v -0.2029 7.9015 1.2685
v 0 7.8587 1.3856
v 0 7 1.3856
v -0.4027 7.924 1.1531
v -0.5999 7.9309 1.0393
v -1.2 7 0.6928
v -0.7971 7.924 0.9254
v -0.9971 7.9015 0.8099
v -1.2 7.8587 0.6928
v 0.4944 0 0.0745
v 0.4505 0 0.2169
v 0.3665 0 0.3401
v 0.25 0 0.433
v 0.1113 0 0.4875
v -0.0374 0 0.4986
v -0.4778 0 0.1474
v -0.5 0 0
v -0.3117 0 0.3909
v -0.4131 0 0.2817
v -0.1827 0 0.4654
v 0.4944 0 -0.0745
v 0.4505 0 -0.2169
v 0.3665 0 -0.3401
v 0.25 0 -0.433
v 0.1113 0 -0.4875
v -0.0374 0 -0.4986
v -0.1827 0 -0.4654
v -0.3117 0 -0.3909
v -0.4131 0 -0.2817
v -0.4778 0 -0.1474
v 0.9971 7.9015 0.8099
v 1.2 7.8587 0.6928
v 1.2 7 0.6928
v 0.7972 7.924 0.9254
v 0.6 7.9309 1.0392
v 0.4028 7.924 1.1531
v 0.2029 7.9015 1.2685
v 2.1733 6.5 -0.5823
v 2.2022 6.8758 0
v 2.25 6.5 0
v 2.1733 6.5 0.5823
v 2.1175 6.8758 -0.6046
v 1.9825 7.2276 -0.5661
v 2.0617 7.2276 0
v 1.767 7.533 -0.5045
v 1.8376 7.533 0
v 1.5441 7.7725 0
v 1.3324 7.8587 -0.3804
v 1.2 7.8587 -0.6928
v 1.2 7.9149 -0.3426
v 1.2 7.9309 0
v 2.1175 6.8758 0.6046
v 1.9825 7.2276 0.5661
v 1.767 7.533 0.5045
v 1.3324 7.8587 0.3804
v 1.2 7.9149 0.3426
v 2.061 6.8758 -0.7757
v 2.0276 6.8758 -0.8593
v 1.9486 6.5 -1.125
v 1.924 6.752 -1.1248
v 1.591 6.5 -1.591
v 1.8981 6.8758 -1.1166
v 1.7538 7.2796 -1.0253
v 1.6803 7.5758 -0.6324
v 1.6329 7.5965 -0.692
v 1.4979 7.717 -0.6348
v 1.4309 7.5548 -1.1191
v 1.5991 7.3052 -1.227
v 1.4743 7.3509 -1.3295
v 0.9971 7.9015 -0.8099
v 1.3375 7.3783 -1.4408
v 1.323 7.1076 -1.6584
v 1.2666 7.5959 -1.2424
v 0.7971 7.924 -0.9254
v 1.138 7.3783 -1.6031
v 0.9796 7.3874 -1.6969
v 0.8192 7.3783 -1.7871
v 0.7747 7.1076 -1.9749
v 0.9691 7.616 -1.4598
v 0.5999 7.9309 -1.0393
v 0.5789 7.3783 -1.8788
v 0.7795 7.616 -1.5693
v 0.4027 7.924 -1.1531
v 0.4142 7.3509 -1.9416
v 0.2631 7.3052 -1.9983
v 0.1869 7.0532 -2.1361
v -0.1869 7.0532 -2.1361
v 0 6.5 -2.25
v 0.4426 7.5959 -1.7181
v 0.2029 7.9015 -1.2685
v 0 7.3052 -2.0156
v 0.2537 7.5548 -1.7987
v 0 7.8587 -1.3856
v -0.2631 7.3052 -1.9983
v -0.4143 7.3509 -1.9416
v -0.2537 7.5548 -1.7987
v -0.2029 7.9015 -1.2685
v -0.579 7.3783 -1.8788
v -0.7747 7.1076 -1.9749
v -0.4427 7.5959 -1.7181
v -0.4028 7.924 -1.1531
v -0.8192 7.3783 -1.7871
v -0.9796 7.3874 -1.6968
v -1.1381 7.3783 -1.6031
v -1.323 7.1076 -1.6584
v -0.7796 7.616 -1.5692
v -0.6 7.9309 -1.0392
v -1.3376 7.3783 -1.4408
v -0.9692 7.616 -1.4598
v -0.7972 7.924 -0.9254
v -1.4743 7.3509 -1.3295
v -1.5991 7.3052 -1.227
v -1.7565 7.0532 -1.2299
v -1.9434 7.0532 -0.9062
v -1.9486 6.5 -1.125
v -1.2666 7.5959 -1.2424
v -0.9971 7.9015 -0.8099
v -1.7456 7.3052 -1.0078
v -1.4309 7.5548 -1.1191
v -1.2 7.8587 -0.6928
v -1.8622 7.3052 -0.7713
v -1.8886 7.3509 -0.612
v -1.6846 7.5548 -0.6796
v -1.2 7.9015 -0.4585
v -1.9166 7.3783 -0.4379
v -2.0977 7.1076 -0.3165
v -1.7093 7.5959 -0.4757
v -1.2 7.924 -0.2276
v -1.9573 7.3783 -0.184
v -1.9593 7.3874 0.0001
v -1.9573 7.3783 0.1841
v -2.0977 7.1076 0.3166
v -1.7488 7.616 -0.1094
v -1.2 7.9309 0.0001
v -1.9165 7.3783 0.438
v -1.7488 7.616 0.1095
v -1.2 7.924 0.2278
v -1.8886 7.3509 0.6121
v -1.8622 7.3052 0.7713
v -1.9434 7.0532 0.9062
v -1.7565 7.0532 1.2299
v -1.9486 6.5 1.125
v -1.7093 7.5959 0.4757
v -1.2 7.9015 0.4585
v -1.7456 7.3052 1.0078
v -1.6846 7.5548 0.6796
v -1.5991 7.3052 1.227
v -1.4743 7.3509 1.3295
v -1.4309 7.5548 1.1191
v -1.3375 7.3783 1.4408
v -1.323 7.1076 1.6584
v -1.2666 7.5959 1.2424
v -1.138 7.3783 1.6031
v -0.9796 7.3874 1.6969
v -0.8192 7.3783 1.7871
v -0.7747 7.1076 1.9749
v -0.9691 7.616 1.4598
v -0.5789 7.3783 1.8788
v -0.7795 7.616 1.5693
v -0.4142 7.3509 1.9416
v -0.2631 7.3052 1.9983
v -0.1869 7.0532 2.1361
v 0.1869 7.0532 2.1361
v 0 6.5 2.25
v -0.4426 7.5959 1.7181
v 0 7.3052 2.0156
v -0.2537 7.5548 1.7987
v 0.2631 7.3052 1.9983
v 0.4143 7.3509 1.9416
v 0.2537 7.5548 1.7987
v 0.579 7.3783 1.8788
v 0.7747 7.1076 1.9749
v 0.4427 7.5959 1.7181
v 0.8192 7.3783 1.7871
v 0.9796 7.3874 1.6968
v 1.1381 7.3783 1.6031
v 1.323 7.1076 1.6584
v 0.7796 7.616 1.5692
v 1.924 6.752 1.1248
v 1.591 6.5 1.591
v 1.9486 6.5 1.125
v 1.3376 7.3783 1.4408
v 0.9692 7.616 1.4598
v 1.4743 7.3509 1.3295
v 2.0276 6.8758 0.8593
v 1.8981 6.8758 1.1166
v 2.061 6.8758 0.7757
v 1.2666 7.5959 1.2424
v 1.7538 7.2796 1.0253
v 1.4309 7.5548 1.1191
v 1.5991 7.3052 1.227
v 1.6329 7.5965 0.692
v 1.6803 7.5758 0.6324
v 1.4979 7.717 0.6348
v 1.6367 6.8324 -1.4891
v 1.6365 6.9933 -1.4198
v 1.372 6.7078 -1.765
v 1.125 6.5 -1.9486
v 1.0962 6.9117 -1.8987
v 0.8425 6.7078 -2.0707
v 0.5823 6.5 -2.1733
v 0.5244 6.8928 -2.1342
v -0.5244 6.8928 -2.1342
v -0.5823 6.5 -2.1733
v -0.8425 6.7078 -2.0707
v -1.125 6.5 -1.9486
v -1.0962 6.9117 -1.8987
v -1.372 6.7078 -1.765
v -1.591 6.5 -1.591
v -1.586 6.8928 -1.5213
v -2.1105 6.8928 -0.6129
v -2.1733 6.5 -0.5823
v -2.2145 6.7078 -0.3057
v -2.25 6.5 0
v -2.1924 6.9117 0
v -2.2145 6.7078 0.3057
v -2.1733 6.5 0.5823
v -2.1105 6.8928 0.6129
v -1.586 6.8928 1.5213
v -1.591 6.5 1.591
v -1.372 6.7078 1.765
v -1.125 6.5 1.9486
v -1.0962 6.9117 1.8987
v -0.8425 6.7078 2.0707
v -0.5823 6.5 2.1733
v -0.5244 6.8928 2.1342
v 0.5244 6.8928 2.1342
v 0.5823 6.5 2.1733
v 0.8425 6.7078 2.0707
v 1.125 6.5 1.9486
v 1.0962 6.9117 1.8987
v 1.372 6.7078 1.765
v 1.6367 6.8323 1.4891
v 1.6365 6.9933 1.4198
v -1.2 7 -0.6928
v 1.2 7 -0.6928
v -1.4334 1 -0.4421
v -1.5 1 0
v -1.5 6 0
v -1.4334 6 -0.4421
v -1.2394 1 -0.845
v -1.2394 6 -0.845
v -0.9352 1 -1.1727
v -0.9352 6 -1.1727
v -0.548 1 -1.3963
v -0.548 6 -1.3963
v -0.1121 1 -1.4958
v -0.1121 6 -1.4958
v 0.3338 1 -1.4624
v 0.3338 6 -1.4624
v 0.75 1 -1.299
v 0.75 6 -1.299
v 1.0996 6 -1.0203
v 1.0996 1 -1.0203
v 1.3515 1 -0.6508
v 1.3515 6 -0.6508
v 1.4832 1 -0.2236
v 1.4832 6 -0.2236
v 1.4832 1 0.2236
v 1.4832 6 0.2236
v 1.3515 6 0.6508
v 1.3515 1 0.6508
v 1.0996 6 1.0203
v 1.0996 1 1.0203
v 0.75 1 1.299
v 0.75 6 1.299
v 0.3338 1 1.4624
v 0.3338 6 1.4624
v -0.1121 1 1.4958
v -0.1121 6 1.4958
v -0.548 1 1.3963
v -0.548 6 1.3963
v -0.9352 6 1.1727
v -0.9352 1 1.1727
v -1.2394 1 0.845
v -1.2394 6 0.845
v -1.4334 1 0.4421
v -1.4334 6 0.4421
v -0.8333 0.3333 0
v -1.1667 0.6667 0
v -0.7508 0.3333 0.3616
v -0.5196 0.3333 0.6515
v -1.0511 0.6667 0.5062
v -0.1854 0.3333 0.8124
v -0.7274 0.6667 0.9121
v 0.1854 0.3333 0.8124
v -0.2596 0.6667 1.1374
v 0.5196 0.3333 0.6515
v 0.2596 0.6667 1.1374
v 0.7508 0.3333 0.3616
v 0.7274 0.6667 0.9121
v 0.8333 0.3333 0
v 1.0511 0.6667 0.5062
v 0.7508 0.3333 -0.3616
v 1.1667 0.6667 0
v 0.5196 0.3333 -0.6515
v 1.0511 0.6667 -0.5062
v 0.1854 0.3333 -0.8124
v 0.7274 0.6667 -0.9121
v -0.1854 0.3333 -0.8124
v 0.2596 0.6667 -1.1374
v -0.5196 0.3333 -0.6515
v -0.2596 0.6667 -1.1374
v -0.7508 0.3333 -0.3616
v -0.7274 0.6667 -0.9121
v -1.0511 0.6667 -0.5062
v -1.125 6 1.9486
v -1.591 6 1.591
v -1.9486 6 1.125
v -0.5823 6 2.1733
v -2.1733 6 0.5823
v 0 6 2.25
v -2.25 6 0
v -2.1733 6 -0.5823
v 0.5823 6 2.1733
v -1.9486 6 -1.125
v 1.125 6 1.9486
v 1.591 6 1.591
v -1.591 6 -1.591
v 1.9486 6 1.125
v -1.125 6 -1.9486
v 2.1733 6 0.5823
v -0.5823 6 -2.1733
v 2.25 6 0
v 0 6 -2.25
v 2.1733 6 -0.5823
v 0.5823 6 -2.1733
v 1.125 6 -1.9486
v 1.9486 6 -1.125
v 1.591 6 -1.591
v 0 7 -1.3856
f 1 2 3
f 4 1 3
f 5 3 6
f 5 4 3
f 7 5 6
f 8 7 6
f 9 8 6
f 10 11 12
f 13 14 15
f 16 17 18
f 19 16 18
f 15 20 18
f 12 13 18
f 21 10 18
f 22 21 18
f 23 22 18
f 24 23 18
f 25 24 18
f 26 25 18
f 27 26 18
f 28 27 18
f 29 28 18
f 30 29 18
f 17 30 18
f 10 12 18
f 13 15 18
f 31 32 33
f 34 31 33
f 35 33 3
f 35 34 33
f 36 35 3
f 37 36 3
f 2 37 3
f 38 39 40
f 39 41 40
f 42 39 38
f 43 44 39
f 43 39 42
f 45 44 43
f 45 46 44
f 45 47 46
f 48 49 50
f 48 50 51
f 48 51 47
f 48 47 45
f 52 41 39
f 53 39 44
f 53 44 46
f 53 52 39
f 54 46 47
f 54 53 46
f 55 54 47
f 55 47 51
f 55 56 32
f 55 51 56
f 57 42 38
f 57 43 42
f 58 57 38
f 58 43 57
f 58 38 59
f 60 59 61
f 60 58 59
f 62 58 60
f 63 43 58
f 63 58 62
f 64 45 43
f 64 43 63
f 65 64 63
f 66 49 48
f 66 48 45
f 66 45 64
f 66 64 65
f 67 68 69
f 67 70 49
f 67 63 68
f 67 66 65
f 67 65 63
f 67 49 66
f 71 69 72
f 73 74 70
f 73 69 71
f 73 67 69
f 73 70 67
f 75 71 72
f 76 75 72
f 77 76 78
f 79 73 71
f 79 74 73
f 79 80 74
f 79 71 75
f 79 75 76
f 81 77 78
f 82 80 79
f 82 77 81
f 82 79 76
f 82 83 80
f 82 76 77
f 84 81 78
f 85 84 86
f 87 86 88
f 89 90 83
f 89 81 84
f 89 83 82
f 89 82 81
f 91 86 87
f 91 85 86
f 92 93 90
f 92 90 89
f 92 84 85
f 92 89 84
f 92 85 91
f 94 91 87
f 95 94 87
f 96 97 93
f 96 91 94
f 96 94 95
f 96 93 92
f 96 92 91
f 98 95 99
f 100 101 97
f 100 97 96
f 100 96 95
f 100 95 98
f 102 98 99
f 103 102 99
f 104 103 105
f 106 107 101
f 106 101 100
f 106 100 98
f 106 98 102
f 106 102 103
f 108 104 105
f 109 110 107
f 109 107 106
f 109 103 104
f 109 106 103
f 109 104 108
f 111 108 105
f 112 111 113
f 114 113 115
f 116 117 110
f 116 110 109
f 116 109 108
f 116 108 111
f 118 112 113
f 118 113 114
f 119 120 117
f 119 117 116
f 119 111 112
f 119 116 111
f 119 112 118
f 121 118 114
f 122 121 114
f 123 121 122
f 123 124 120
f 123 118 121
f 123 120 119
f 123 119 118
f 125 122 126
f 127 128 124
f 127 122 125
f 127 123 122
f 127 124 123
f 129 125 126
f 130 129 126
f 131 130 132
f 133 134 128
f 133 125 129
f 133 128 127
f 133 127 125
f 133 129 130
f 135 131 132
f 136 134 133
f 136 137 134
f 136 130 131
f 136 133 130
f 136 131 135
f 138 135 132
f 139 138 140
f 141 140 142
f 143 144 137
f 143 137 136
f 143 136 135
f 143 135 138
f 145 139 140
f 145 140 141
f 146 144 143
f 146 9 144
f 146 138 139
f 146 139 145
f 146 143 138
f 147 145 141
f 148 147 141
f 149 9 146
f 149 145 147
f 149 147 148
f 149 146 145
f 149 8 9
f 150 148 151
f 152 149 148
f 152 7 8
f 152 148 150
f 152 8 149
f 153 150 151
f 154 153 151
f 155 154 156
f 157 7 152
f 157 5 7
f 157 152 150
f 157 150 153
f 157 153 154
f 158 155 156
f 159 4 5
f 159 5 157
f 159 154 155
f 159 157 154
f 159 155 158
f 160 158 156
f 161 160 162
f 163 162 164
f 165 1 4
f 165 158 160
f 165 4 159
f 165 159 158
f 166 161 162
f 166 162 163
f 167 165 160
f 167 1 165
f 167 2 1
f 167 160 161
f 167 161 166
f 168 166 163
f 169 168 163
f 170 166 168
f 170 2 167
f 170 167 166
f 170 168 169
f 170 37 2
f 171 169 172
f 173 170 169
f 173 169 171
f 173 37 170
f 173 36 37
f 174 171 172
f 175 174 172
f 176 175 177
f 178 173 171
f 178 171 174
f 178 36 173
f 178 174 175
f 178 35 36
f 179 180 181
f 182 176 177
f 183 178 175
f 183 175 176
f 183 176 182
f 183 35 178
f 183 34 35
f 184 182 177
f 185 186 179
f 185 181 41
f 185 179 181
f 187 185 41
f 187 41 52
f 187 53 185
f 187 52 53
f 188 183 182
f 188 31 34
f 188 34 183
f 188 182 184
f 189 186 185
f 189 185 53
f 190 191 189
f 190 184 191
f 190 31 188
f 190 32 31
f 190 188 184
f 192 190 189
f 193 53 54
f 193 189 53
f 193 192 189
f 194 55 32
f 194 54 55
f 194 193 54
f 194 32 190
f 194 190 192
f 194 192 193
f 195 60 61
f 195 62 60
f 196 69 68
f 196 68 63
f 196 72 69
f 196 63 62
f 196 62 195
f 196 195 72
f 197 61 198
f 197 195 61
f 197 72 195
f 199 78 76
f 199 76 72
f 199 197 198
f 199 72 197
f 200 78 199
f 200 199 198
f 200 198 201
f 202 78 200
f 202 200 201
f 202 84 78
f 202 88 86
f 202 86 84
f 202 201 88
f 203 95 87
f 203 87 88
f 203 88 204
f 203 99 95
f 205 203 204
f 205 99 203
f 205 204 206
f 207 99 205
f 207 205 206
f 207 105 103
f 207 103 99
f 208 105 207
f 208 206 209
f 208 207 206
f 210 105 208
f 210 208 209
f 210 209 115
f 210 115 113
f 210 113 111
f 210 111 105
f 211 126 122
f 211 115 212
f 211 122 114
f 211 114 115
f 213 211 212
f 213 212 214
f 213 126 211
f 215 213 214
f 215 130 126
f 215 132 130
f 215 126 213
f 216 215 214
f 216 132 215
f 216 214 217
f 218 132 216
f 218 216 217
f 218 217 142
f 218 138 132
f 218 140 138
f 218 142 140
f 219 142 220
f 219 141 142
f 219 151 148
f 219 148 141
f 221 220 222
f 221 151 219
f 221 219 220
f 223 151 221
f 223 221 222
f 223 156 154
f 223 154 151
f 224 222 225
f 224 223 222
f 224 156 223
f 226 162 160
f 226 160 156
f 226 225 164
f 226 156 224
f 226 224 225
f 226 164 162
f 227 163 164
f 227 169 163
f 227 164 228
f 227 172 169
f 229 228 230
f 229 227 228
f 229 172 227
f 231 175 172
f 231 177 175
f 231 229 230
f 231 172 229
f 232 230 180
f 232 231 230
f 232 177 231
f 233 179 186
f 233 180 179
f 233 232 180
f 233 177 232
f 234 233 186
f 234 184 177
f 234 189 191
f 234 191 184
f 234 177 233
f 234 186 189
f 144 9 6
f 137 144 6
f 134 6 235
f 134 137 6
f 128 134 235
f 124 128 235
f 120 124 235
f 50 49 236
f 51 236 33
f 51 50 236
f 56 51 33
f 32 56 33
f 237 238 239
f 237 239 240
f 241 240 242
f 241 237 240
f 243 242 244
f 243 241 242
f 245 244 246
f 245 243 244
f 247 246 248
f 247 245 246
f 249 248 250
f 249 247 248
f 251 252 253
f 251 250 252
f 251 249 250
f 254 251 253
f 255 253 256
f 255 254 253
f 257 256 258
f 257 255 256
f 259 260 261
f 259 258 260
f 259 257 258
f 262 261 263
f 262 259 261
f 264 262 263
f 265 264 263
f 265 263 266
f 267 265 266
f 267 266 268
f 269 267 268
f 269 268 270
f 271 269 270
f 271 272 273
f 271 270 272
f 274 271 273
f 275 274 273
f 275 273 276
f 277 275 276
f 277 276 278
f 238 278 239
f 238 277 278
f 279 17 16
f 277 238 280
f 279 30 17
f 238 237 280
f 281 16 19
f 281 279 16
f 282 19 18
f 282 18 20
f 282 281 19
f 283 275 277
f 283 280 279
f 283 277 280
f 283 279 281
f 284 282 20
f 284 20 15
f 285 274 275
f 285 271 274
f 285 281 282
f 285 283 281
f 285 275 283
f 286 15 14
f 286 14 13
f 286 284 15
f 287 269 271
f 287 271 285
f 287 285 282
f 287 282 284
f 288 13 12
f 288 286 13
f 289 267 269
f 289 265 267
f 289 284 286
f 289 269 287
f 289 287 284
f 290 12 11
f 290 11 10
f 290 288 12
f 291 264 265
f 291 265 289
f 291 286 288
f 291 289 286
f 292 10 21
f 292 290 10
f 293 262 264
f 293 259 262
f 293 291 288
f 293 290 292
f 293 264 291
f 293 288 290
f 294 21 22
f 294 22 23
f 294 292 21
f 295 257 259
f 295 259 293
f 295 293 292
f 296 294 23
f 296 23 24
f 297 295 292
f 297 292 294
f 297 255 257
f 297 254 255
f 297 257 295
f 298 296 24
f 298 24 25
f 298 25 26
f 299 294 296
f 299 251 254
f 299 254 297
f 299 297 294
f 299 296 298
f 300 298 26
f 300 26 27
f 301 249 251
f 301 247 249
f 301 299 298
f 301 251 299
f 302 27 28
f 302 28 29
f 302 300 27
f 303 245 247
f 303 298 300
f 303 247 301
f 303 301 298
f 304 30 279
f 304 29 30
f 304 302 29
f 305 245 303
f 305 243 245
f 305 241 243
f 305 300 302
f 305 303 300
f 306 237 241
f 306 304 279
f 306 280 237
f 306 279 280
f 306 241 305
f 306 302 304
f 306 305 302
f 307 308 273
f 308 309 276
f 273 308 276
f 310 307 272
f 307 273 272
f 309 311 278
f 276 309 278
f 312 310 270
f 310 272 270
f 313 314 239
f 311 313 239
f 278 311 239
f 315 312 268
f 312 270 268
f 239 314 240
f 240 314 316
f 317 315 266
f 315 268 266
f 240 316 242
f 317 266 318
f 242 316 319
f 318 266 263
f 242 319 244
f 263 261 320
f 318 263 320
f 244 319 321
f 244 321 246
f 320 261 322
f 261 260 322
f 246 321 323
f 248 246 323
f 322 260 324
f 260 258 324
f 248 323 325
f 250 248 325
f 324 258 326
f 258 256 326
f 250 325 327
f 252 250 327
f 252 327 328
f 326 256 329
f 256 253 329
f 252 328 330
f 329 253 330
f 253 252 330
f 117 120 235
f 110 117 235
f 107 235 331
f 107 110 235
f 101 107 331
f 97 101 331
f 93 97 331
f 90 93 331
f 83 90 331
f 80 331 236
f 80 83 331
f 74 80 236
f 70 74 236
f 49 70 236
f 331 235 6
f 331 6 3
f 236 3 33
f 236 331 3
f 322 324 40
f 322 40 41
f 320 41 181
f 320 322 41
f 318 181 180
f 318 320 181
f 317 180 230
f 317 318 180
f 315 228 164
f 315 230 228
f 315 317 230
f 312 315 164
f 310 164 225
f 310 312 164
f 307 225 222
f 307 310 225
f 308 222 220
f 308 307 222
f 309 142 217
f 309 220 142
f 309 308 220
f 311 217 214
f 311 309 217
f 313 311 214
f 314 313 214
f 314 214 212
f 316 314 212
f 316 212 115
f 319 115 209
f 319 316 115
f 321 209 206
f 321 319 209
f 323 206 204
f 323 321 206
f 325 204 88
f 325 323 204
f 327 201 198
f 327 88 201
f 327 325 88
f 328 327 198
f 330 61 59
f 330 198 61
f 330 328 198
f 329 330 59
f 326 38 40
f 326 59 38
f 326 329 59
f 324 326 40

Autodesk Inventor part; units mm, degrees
ref_plane "YZ Plane" through (0, 0, 0) normal (1, 0, 0) x (0, 1, 0)
sketch "Sketch1" plane through (0, 0, 0) normal (0, 1, 0) x (-1, 0, 0)
  circle A0 centre (0, 0) radius 1.5
  dimension "d0" = 3
extrude "Extrusion1" add sketch "Sketch1" along normal blind 6
chamfer "Chamfer1" distance 1 angle 45 1 edges at (1.5, 0, 0)
ref_plane "Work Plane1" through (0, 6, 0) normal (0, 1, 0) x (1, 0, 0)
sketch "Sketch2" plane through (0, 6, 0) normal (0, 1, 0) x (1, 0, 0)
  circle A0 centre (0, 0) radius 0.5 projected
  circle A1 centre (0, 0) radius 2.25
  dimension "d7" = 4.5
extrude "Extrusion2" add sketch "Sketch2" along normal blind 2 contours A0 | A1
fillet "Fillet1" radius 1.5 1 edges at (-2.25, 8, 0)
ref_plane "Work Plane2" through (0, 8, 0) normal (0, 1, 0) x (1, 0, 0)
sketch "Sketch3" plane through (0, 8, 0) normal (0, 1, 0) x (1, 0, 0)
  line L0 (-1.2, 0.6928) -> (0, 1.3856)
  line L1 (0, 1.3856) -> (1.2, 0.6928)
  line L2 (1.2, 0.6928) -> (1.2, -0.6928)
  line L3 (1.2, -0.6928) -> (0, -1.3856)
  line L4 (0, -1.3856) -> (-1.2, -0.6928)
  line L5 (-1.2, -0.6928) -> (-1.2, 0.6928)
  point P0 (0, 0)
  point P1 (0, 0)
  dimension "d12" = 1.2
extrude "Extrusion3" cut sketch "Sketch3" against normal blind 1
thread "Thread1" size "M3x0.5" class "6g" standard "ANSI Metric M Profile" full length
properties part number "M3x6mm_screw"
